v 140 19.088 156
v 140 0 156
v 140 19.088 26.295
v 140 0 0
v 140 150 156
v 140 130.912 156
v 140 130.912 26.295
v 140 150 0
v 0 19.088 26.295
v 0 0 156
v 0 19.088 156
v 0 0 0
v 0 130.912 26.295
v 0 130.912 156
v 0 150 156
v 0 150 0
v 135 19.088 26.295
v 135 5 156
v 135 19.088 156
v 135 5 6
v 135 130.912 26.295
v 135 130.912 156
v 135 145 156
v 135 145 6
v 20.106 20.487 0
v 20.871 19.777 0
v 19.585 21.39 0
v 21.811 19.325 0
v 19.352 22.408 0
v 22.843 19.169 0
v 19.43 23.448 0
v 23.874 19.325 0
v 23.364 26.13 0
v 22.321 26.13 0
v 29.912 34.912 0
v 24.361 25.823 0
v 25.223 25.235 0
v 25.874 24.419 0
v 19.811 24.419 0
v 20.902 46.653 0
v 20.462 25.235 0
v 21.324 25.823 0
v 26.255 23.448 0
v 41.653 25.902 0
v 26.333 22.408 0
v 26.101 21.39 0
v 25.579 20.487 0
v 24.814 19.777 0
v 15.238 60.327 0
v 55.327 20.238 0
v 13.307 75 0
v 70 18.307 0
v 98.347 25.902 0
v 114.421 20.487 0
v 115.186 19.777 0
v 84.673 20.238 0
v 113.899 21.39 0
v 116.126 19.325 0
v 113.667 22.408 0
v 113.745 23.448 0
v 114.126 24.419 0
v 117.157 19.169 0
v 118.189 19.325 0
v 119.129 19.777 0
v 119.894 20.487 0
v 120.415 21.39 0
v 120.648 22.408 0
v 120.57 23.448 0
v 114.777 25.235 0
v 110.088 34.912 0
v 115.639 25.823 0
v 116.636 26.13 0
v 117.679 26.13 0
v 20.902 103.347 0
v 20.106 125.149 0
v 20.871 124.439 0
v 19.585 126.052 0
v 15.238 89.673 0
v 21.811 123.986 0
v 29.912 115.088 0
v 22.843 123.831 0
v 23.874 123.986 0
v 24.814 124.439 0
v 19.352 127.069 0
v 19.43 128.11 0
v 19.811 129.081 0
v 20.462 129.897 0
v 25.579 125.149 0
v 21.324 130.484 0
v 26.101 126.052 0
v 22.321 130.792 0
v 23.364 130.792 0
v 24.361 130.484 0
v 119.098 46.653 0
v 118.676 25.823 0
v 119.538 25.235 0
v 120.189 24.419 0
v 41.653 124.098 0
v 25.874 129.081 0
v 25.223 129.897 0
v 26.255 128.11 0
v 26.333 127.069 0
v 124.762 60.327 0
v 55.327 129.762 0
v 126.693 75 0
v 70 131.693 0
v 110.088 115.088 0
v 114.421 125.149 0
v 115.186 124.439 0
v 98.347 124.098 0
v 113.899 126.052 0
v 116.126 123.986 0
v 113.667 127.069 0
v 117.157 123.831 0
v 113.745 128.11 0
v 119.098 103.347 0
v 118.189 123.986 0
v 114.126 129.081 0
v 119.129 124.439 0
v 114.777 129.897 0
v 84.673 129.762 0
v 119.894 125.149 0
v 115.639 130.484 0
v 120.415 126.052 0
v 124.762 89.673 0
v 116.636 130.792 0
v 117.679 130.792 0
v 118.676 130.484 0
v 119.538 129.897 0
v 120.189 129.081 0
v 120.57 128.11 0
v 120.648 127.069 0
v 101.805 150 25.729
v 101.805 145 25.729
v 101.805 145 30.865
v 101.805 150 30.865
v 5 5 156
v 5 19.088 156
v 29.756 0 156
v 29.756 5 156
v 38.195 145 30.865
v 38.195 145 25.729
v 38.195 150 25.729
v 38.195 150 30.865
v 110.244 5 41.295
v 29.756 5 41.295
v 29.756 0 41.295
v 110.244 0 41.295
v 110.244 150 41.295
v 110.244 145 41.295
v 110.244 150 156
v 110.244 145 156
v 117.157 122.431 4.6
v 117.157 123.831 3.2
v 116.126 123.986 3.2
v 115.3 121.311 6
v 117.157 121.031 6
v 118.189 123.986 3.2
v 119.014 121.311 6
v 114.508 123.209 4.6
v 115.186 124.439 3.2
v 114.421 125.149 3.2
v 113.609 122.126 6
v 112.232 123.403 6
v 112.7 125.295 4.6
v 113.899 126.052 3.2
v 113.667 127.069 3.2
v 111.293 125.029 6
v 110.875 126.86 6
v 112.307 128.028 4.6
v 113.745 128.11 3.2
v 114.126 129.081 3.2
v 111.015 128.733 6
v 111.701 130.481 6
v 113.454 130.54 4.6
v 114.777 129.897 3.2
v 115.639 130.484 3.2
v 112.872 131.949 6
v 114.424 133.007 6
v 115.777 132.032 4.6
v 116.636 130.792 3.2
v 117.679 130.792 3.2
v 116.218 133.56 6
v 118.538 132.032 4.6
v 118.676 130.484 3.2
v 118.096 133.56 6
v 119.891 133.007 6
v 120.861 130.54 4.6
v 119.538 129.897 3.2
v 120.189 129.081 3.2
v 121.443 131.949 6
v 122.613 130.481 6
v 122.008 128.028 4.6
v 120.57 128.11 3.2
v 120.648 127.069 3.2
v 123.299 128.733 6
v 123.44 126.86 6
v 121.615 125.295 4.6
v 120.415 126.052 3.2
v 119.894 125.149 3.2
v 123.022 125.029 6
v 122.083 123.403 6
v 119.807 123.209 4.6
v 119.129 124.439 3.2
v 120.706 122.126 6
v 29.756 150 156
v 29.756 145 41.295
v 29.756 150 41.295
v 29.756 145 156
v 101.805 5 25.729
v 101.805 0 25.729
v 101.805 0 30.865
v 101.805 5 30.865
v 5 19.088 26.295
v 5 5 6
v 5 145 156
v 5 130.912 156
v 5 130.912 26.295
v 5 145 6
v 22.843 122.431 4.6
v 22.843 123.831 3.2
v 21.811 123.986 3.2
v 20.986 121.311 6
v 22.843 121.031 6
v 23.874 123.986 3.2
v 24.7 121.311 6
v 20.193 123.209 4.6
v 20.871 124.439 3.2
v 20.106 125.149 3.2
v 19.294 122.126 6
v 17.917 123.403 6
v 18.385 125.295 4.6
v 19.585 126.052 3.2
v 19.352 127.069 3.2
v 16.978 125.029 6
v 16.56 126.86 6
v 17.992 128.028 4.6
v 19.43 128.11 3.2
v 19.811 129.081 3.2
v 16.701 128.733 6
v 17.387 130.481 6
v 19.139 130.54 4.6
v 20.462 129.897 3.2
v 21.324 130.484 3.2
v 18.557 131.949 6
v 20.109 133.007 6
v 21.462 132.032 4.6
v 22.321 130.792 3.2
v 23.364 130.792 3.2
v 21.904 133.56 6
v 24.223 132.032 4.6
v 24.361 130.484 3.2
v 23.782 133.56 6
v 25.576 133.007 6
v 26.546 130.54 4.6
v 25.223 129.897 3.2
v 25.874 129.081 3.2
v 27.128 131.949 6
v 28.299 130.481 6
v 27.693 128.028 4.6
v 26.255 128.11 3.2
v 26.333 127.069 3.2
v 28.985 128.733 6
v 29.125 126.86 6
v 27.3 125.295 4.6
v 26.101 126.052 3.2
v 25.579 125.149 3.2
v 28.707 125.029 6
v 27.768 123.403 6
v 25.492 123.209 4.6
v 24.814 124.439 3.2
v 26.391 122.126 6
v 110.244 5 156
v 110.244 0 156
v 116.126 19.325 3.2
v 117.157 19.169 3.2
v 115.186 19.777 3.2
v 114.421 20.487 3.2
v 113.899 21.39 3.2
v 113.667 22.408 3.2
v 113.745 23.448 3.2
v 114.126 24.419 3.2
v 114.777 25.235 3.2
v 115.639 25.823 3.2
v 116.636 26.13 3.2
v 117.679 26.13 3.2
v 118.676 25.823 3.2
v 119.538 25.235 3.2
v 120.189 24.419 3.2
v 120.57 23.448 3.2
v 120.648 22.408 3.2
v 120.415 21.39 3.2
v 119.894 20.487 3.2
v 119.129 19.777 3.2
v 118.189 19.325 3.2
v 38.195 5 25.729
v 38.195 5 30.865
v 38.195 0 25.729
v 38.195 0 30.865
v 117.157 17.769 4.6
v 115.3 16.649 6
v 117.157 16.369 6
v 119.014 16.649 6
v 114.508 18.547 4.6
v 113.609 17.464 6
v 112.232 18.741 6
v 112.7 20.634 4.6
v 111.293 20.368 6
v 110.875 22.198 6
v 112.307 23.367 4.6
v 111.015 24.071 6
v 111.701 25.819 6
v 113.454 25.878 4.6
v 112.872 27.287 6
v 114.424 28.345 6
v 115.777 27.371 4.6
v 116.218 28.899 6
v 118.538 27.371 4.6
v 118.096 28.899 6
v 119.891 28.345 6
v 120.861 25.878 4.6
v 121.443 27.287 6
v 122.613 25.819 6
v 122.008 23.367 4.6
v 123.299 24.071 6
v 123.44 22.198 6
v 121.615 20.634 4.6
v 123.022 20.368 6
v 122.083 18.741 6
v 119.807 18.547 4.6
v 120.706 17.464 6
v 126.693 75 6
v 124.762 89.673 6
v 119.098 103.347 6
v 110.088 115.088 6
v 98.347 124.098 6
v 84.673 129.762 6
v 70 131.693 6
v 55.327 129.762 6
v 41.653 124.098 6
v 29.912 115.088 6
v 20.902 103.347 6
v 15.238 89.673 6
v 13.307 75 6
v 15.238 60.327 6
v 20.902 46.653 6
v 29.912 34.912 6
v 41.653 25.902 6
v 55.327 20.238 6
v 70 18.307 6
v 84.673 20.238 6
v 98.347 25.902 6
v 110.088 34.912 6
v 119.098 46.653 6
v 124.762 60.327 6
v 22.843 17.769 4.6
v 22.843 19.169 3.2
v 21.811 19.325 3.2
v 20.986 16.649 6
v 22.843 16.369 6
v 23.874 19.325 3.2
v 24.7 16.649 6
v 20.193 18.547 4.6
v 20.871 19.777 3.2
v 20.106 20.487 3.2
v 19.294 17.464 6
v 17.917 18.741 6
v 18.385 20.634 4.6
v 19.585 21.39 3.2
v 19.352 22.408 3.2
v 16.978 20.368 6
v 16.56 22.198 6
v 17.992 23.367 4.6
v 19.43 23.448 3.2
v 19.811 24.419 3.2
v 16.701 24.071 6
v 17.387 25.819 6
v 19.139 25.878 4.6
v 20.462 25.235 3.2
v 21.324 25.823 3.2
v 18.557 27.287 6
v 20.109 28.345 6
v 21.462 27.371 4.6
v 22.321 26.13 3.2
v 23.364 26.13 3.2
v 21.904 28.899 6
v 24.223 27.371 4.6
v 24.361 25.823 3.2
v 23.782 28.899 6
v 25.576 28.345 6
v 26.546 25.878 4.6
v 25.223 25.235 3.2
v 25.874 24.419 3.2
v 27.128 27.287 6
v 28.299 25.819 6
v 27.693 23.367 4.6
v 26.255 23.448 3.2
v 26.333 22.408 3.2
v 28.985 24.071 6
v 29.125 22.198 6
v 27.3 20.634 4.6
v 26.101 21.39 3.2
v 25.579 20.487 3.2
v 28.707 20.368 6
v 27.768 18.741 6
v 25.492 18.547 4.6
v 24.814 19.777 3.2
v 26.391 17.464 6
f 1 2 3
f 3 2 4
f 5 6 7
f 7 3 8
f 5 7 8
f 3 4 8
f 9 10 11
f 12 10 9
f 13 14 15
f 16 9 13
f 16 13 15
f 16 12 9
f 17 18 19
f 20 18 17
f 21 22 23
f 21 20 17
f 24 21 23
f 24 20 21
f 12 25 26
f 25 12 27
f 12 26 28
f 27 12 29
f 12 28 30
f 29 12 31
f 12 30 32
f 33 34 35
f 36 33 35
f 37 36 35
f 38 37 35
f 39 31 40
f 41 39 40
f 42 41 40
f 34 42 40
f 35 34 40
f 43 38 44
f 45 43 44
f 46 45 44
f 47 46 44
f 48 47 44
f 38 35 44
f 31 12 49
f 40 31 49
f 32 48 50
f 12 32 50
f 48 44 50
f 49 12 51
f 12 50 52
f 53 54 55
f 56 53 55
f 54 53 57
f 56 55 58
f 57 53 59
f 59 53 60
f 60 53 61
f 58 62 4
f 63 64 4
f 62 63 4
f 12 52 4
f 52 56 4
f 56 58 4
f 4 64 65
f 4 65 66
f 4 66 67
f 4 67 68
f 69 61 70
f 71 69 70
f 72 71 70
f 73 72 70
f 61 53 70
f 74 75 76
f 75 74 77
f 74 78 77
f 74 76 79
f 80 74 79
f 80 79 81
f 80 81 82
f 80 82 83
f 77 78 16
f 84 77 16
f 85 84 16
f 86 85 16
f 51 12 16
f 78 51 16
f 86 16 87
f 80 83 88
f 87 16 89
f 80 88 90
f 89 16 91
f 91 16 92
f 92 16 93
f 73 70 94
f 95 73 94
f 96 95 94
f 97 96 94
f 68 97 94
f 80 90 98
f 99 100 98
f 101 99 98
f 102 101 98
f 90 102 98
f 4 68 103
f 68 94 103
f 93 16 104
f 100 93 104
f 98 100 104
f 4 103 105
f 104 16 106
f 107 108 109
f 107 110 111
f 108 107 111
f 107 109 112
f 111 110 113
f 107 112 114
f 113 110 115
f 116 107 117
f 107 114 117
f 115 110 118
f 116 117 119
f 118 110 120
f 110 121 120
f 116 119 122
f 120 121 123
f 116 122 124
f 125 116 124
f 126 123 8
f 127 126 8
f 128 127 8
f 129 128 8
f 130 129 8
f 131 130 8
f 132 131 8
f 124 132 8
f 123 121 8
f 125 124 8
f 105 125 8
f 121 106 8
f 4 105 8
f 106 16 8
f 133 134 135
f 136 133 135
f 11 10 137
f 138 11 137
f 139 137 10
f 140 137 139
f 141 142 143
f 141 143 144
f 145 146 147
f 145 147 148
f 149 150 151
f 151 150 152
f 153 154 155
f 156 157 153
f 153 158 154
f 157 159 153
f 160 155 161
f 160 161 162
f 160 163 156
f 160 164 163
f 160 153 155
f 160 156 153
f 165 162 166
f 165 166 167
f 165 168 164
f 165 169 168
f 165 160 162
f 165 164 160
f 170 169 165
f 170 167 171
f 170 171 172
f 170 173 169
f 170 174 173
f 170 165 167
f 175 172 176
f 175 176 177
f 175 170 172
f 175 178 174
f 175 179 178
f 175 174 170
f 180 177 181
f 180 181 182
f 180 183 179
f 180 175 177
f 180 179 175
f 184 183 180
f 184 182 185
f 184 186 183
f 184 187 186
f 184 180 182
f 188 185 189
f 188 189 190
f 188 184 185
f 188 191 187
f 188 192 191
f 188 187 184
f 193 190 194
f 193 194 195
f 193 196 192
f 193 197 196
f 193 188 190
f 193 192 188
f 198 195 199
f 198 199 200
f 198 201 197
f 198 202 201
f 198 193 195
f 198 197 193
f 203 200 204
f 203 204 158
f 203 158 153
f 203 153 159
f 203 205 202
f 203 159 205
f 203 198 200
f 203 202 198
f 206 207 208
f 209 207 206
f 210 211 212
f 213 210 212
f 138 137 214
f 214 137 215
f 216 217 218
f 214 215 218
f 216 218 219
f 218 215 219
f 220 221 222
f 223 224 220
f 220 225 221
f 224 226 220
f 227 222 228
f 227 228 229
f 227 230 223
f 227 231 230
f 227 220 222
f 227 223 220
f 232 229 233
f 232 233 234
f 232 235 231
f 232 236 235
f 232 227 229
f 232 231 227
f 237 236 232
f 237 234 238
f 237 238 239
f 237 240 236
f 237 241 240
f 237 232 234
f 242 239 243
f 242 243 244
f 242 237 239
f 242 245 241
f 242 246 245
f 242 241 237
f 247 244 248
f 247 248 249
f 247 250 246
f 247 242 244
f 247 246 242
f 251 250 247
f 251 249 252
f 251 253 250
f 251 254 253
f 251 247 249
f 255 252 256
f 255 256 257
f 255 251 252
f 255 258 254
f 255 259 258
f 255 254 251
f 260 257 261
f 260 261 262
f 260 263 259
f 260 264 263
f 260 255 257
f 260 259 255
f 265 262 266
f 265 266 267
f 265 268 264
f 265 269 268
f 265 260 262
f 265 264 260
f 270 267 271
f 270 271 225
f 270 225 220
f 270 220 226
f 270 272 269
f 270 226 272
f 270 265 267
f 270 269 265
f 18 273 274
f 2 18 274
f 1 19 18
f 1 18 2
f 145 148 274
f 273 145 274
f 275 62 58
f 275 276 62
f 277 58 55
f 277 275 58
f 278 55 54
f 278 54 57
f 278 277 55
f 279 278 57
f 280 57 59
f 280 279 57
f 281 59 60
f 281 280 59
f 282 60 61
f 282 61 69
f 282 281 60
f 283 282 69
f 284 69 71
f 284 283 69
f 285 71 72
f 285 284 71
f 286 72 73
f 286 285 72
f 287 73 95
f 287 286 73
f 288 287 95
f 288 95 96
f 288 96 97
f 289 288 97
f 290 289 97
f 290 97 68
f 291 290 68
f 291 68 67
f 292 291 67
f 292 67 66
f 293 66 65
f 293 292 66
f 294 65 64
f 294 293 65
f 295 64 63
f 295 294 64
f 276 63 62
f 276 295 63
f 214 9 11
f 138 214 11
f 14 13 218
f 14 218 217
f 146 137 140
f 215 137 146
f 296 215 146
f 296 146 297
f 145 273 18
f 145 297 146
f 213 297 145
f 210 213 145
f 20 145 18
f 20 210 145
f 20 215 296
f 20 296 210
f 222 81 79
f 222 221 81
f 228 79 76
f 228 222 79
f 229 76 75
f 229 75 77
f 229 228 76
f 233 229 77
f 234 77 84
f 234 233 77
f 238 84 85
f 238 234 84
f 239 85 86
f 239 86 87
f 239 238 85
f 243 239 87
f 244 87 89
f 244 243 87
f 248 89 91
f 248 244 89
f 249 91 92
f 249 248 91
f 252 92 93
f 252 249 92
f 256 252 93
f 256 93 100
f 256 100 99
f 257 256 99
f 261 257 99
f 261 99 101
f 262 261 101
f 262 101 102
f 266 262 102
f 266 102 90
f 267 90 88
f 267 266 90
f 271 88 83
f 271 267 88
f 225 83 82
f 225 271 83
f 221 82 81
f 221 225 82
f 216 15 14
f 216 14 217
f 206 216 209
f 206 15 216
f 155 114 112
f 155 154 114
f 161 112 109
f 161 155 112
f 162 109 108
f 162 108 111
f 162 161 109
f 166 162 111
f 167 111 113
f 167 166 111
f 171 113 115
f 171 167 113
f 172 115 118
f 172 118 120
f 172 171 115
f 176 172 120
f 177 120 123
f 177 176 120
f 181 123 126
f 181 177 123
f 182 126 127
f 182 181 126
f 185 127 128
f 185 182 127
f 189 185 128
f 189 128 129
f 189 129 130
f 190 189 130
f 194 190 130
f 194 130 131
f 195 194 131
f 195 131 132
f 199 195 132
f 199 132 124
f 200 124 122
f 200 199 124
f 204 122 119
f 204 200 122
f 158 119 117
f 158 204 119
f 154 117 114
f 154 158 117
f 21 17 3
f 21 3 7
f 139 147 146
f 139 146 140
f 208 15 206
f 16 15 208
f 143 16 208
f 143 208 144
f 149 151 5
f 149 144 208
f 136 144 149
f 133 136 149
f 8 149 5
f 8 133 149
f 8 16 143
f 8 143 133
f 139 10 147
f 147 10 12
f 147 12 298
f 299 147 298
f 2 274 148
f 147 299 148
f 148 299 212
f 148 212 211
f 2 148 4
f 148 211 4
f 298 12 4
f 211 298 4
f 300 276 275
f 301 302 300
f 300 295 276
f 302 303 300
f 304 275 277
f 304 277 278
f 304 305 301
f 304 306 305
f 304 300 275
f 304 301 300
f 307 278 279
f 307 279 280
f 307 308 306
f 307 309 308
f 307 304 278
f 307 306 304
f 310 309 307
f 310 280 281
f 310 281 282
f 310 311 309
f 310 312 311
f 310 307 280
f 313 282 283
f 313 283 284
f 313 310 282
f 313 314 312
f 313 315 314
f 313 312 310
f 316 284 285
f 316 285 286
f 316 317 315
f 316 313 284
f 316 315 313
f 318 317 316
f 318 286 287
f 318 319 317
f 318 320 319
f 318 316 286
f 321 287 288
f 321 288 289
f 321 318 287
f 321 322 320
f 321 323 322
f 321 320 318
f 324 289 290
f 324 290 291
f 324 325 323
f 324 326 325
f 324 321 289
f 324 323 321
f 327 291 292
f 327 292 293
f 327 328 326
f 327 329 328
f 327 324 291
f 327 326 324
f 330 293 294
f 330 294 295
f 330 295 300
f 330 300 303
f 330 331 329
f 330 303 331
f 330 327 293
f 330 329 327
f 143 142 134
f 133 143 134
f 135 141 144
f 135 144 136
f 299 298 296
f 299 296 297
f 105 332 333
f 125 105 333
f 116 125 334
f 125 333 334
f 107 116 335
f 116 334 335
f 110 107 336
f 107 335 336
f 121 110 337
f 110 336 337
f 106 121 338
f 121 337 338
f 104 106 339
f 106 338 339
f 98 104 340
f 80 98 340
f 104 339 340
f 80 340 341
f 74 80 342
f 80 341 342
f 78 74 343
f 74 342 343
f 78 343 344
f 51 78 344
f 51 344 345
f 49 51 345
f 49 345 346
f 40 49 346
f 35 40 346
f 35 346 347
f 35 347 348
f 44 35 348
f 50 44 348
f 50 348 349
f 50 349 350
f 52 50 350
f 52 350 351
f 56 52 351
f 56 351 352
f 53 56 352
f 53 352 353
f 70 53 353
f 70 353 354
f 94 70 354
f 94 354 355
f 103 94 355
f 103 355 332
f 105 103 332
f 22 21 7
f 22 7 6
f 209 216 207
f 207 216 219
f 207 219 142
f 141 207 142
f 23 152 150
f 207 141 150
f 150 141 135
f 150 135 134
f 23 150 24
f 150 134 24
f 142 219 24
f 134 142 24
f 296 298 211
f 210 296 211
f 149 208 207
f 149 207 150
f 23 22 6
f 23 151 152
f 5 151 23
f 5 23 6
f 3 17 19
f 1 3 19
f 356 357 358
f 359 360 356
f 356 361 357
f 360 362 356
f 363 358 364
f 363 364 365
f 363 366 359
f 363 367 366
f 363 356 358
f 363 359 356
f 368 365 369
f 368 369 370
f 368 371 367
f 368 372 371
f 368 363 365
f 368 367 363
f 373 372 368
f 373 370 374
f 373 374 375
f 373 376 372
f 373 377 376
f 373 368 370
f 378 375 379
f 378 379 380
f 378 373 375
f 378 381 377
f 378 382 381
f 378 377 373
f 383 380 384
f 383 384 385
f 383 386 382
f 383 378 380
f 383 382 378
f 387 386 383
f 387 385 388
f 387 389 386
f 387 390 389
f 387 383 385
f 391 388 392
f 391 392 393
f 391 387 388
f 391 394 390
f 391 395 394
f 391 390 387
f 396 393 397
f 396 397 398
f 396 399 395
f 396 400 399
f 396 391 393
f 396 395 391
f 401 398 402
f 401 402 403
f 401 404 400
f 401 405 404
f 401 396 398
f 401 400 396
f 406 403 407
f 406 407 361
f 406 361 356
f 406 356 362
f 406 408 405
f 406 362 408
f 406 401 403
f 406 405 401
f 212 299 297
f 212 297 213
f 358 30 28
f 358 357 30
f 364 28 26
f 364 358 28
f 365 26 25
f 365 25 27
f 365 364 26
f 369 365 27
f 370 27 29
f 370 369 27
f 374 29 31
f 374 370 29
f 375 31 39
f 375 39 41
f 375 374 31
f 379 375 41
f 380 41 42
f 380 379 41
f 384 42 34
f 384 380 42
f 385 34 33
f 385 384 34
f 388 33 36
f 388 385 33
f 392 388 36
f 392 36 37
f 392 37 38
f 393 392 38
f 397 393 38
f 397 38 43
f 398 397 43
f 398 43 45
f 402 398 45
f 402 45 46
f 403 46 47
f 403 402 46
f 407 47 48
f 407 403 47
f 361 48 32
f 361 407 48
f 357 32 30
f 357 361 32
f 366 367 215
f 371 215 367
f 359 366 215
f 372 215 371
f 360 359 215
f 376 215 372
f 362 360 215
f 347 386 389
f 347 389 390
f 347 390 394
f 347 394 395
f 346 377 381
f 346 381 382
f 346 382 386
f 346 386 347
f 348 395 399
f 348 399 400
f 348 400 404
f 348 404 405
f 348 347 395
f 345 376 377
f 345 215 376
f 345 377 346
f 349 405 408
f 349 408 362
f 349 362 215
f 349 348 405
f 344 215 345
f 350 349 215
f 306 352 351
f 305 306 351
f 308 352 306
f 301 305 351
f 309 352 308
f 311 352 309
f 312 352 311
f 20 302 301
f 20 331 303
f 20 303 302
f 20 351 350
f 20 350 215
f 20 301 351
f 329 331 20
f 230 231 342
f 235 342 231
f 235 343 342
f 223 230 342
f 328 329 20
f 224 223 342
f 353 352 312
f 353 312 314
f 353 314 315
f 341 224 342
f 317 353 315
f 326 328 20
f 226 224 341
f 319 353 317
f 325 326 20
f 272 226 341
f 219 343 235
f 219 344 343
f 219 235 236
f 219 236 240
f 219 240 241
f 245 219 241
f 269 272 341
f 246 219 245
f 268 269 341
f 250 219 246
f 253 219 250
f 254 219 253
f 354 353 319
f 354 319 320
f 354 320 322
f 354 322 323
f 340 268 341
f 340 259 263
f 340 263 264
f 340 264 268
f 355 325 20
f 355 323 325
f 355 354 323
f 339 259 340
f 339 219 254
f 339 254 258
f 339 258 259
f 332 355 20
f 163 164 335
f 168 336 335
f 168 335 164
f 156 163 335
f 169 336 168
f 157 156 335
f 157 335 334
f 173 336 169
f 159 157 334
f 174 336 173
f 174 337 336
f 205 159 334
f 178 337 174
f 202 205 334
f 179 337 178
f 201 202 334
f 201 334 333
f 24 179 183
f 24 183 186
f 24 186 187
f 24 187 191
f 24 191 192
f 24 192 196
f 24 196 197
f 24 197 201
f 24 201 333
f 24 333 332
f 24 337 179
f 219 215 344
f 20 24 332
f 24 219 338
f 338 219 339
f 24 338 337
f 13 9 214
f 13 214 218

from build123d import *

# Parameters (mm, degrees)
ESBO_O1_W                                    = 140
ESBO_O1_H                                    = 150
RESSALTO_EXTRUS_O1_DEPTH                     = 6
ESBO_O2_W                                    = 140
ESBO_O2_H                                    = 150
ESBO_O2_W_2                                  = 130
ESBO_O2_H_2                                  = 140
RESSALTO_EXTRUS_O2_DEPTH                     = 150
ESBO_O3_W                                    = 80.487326646
ESBO_O3_H                                    = 259.40979835
CORTE_EXTRUS_O1_DEPTH                        = 150
ESBO_O4_W                                    = 259.40979835
ESBO_O4_H                                    = 111.824801178
CORTE_EXTRUS_O2_DEPTH                        = 150
ESCAREADO_PARA_PARAFUSO_COM_CABE_A_E_2_COUNT = 2
ESCAREADO_PARA_PARAFUSO_COM_CABE_A_E_2_PITCH = 94.314867898
ESCAREADO_PARA_PARAFUSO_COM_CABE_A_E_3_COUNT = 2
ESCAREADO_PARA_PARAFUSO_COM_CABE_A_E_3_PITCH = 104.661646655
ESCAREADO_PARA_PARAFUSO_COM_CABE_A_E_4_COUNT = 2
ESCAREADO_PARA_PARAFUSO_COM_CABE_A_E_4_PITCH = 140.887737533
ESBO_O11_W                                   = 80.487326646
ESBO_O11_H                                   = 5
RESSALTO_EXTRUS_O5_DEPTH                     = 15
ESBO_O12_W                                   = 63.61017092
ESBO_O12_H                                   = 5.135500038
CORTE_EXTRUS_O3_DEPTH                        = 219
ESBO_O13_R                                   = 56.69336486
CORTE_EXTRUS_O4_DEPTH                        = 10


with BuildPart() as part:
    # Esboço1 → Ressalto-extrusão1 (new body)
    with BuildSketch(Plane.XY):
        with Locations((70, 75)):
            Rectangle(ESBO_O1_W, ESBO_O1_H)
    extrude(amount=RESSALTO_EXTRUS_O1_DEPTH)

    # Esboço2 → Ressalto-extrusão2 (add)
    with BuildSketch(Plane.XY.offset(6)):
        with Locations((70, 75)):
            Rectangle(ESBO_O2_W, ESBO_O2_H)
        with Locations((70, 75)):
            Rectangle(ESBO_O2_W_2, ESBO_O2_H_2, mode=Mode.SUBTRACT)
    extrude(amount=RESSALTO_EXTRUS_O2_DEPTH)

    # Esboço3 → Corte-extrusão1 (cut)
    with BuildSketch(Plane.XZ):
        with Locations((70, 156)):
            Rectangle(ESBO_O3_W, ESBO_O3_H)
    extrude(amount=-CORTE_EXTRUS_O1_DEPTH, mode=Mode.SUBTRACT)

    # Esboço4 → Corte-extrusão2 (cut)
    with BuildSketch(Plane.ZY):
        with Locations((156, 75)):
            Rectangle(ESBO_O4_W, ESBO_O4_H)
    extrude(amount=-CORTE_EXTRUS_O2_DEPTH, mode=Mode.SUBTRACT)

    # Esboço6 → Escareado para parafuso com cabeça escareada elevada de M61 (revolve, cut)
    with BuildSketch(Plane(origin=(22.842566051, 127.330823328, 6), x_dir=(0, -1, 0), z_dir=(1, 0, 0))):
        Polygon((0, 0), (0, 6), (3.5, 6), (3.5, 2.8), (6.3, 0), align=None)
    escareado_para_parafuso_com_cabe_a_escar = revolve(axis=Axis((22.842566051, 127.330823328, 12.35), (0, 0, -1)), mode=Mode.SUBTRACT)

    # Escareado para parafuso com cabe_a e 2: Escareado para parafuso com cabeça escareada elevada de M61 ×2
    with Locations(*[(i * ESCAREADO_PARA_PARAFUSO_COM_CABE_A_E_2_PITCH, 0, 0) for i in range(1, ESCAREADO_PARA_PARAFUSO_COM_CABE_A_E_2_COUNT)]):
        add(escareado_para_parafuso_com_cabe_a_escar, mode=Mode.SUBTRACT)

    # Escareado para parafuso com cabe_a e 3: Escareado para parafuso com cabeça escareada elevada de M61 ×2
    with Locations(*[(0, -i * ESCAREADO_PARA_PARAFUSO_COM_CABE_A_E_3_PITCH, 0) for i in range(1, ESCAREADO_PARA_PARAFUSO_COM_CABE_A_E_3_COUNT)]):
        add(escareado_para_parafuso_com_cabe_a_escar, mode=Mode.SUBTRACT)

    # Escareado para parafuso com cabe_a e 4: Escareado para parafuso com cabeça escareada elevada de M61 ×2
    with Locations(*[Vector(0.6694327664681964, -0.7428726480216763, 0) * (i * ESCAREADO_PARA_PARAFUSO_COM_CABE_A_E_4_PITCH) for i in range(1, ESCAREADO_PARA_PARAFUSO_COM_CABE_A_E_4_COUNT)]):
        add(escareado_para_parafuso_com_cabe_a_escar, mode=Mode.SUBTRACT)

    # Esboço11 → Ressalto-extrusão5 (add)
    with BuildSketch(Plane.XY.offset(26.295100825)):
        with Locations((70, 147.5)):
            Rectangle(ESBO_O11_W, ESBO_O11_H)
        with Locations((70, 2.5)):
            Rectangle(ESBO_O11_W, ESBO_O11_H)
    extrude(amount=RESSALTO_EXTRUS_O5_DEPTH)

    # Esboço12 → Corte-extrusão3 (cut)
    with BuildSketch(Plane.XZ):
        with Locations((70, 28.296802645)):
            Rectangle(ESBO_O12_W, ESBO_O12_H)
    extrude(amount=-CORTE_EXTRUS_O3_DEPTH, mode=Mode.SUBTRACT)

    # Esboço13 → Corte-extrusão4 (cut)
    with BuildSketch(Plane.XY.offset(6)):
        with Locations((70, 75)):
            Circle(ESBO_O13_R)
    extrude(amount=-CORTE_EXTRUS_O4_DEPTH, mode=Mode.SUBTRACT)


solid = part.part
